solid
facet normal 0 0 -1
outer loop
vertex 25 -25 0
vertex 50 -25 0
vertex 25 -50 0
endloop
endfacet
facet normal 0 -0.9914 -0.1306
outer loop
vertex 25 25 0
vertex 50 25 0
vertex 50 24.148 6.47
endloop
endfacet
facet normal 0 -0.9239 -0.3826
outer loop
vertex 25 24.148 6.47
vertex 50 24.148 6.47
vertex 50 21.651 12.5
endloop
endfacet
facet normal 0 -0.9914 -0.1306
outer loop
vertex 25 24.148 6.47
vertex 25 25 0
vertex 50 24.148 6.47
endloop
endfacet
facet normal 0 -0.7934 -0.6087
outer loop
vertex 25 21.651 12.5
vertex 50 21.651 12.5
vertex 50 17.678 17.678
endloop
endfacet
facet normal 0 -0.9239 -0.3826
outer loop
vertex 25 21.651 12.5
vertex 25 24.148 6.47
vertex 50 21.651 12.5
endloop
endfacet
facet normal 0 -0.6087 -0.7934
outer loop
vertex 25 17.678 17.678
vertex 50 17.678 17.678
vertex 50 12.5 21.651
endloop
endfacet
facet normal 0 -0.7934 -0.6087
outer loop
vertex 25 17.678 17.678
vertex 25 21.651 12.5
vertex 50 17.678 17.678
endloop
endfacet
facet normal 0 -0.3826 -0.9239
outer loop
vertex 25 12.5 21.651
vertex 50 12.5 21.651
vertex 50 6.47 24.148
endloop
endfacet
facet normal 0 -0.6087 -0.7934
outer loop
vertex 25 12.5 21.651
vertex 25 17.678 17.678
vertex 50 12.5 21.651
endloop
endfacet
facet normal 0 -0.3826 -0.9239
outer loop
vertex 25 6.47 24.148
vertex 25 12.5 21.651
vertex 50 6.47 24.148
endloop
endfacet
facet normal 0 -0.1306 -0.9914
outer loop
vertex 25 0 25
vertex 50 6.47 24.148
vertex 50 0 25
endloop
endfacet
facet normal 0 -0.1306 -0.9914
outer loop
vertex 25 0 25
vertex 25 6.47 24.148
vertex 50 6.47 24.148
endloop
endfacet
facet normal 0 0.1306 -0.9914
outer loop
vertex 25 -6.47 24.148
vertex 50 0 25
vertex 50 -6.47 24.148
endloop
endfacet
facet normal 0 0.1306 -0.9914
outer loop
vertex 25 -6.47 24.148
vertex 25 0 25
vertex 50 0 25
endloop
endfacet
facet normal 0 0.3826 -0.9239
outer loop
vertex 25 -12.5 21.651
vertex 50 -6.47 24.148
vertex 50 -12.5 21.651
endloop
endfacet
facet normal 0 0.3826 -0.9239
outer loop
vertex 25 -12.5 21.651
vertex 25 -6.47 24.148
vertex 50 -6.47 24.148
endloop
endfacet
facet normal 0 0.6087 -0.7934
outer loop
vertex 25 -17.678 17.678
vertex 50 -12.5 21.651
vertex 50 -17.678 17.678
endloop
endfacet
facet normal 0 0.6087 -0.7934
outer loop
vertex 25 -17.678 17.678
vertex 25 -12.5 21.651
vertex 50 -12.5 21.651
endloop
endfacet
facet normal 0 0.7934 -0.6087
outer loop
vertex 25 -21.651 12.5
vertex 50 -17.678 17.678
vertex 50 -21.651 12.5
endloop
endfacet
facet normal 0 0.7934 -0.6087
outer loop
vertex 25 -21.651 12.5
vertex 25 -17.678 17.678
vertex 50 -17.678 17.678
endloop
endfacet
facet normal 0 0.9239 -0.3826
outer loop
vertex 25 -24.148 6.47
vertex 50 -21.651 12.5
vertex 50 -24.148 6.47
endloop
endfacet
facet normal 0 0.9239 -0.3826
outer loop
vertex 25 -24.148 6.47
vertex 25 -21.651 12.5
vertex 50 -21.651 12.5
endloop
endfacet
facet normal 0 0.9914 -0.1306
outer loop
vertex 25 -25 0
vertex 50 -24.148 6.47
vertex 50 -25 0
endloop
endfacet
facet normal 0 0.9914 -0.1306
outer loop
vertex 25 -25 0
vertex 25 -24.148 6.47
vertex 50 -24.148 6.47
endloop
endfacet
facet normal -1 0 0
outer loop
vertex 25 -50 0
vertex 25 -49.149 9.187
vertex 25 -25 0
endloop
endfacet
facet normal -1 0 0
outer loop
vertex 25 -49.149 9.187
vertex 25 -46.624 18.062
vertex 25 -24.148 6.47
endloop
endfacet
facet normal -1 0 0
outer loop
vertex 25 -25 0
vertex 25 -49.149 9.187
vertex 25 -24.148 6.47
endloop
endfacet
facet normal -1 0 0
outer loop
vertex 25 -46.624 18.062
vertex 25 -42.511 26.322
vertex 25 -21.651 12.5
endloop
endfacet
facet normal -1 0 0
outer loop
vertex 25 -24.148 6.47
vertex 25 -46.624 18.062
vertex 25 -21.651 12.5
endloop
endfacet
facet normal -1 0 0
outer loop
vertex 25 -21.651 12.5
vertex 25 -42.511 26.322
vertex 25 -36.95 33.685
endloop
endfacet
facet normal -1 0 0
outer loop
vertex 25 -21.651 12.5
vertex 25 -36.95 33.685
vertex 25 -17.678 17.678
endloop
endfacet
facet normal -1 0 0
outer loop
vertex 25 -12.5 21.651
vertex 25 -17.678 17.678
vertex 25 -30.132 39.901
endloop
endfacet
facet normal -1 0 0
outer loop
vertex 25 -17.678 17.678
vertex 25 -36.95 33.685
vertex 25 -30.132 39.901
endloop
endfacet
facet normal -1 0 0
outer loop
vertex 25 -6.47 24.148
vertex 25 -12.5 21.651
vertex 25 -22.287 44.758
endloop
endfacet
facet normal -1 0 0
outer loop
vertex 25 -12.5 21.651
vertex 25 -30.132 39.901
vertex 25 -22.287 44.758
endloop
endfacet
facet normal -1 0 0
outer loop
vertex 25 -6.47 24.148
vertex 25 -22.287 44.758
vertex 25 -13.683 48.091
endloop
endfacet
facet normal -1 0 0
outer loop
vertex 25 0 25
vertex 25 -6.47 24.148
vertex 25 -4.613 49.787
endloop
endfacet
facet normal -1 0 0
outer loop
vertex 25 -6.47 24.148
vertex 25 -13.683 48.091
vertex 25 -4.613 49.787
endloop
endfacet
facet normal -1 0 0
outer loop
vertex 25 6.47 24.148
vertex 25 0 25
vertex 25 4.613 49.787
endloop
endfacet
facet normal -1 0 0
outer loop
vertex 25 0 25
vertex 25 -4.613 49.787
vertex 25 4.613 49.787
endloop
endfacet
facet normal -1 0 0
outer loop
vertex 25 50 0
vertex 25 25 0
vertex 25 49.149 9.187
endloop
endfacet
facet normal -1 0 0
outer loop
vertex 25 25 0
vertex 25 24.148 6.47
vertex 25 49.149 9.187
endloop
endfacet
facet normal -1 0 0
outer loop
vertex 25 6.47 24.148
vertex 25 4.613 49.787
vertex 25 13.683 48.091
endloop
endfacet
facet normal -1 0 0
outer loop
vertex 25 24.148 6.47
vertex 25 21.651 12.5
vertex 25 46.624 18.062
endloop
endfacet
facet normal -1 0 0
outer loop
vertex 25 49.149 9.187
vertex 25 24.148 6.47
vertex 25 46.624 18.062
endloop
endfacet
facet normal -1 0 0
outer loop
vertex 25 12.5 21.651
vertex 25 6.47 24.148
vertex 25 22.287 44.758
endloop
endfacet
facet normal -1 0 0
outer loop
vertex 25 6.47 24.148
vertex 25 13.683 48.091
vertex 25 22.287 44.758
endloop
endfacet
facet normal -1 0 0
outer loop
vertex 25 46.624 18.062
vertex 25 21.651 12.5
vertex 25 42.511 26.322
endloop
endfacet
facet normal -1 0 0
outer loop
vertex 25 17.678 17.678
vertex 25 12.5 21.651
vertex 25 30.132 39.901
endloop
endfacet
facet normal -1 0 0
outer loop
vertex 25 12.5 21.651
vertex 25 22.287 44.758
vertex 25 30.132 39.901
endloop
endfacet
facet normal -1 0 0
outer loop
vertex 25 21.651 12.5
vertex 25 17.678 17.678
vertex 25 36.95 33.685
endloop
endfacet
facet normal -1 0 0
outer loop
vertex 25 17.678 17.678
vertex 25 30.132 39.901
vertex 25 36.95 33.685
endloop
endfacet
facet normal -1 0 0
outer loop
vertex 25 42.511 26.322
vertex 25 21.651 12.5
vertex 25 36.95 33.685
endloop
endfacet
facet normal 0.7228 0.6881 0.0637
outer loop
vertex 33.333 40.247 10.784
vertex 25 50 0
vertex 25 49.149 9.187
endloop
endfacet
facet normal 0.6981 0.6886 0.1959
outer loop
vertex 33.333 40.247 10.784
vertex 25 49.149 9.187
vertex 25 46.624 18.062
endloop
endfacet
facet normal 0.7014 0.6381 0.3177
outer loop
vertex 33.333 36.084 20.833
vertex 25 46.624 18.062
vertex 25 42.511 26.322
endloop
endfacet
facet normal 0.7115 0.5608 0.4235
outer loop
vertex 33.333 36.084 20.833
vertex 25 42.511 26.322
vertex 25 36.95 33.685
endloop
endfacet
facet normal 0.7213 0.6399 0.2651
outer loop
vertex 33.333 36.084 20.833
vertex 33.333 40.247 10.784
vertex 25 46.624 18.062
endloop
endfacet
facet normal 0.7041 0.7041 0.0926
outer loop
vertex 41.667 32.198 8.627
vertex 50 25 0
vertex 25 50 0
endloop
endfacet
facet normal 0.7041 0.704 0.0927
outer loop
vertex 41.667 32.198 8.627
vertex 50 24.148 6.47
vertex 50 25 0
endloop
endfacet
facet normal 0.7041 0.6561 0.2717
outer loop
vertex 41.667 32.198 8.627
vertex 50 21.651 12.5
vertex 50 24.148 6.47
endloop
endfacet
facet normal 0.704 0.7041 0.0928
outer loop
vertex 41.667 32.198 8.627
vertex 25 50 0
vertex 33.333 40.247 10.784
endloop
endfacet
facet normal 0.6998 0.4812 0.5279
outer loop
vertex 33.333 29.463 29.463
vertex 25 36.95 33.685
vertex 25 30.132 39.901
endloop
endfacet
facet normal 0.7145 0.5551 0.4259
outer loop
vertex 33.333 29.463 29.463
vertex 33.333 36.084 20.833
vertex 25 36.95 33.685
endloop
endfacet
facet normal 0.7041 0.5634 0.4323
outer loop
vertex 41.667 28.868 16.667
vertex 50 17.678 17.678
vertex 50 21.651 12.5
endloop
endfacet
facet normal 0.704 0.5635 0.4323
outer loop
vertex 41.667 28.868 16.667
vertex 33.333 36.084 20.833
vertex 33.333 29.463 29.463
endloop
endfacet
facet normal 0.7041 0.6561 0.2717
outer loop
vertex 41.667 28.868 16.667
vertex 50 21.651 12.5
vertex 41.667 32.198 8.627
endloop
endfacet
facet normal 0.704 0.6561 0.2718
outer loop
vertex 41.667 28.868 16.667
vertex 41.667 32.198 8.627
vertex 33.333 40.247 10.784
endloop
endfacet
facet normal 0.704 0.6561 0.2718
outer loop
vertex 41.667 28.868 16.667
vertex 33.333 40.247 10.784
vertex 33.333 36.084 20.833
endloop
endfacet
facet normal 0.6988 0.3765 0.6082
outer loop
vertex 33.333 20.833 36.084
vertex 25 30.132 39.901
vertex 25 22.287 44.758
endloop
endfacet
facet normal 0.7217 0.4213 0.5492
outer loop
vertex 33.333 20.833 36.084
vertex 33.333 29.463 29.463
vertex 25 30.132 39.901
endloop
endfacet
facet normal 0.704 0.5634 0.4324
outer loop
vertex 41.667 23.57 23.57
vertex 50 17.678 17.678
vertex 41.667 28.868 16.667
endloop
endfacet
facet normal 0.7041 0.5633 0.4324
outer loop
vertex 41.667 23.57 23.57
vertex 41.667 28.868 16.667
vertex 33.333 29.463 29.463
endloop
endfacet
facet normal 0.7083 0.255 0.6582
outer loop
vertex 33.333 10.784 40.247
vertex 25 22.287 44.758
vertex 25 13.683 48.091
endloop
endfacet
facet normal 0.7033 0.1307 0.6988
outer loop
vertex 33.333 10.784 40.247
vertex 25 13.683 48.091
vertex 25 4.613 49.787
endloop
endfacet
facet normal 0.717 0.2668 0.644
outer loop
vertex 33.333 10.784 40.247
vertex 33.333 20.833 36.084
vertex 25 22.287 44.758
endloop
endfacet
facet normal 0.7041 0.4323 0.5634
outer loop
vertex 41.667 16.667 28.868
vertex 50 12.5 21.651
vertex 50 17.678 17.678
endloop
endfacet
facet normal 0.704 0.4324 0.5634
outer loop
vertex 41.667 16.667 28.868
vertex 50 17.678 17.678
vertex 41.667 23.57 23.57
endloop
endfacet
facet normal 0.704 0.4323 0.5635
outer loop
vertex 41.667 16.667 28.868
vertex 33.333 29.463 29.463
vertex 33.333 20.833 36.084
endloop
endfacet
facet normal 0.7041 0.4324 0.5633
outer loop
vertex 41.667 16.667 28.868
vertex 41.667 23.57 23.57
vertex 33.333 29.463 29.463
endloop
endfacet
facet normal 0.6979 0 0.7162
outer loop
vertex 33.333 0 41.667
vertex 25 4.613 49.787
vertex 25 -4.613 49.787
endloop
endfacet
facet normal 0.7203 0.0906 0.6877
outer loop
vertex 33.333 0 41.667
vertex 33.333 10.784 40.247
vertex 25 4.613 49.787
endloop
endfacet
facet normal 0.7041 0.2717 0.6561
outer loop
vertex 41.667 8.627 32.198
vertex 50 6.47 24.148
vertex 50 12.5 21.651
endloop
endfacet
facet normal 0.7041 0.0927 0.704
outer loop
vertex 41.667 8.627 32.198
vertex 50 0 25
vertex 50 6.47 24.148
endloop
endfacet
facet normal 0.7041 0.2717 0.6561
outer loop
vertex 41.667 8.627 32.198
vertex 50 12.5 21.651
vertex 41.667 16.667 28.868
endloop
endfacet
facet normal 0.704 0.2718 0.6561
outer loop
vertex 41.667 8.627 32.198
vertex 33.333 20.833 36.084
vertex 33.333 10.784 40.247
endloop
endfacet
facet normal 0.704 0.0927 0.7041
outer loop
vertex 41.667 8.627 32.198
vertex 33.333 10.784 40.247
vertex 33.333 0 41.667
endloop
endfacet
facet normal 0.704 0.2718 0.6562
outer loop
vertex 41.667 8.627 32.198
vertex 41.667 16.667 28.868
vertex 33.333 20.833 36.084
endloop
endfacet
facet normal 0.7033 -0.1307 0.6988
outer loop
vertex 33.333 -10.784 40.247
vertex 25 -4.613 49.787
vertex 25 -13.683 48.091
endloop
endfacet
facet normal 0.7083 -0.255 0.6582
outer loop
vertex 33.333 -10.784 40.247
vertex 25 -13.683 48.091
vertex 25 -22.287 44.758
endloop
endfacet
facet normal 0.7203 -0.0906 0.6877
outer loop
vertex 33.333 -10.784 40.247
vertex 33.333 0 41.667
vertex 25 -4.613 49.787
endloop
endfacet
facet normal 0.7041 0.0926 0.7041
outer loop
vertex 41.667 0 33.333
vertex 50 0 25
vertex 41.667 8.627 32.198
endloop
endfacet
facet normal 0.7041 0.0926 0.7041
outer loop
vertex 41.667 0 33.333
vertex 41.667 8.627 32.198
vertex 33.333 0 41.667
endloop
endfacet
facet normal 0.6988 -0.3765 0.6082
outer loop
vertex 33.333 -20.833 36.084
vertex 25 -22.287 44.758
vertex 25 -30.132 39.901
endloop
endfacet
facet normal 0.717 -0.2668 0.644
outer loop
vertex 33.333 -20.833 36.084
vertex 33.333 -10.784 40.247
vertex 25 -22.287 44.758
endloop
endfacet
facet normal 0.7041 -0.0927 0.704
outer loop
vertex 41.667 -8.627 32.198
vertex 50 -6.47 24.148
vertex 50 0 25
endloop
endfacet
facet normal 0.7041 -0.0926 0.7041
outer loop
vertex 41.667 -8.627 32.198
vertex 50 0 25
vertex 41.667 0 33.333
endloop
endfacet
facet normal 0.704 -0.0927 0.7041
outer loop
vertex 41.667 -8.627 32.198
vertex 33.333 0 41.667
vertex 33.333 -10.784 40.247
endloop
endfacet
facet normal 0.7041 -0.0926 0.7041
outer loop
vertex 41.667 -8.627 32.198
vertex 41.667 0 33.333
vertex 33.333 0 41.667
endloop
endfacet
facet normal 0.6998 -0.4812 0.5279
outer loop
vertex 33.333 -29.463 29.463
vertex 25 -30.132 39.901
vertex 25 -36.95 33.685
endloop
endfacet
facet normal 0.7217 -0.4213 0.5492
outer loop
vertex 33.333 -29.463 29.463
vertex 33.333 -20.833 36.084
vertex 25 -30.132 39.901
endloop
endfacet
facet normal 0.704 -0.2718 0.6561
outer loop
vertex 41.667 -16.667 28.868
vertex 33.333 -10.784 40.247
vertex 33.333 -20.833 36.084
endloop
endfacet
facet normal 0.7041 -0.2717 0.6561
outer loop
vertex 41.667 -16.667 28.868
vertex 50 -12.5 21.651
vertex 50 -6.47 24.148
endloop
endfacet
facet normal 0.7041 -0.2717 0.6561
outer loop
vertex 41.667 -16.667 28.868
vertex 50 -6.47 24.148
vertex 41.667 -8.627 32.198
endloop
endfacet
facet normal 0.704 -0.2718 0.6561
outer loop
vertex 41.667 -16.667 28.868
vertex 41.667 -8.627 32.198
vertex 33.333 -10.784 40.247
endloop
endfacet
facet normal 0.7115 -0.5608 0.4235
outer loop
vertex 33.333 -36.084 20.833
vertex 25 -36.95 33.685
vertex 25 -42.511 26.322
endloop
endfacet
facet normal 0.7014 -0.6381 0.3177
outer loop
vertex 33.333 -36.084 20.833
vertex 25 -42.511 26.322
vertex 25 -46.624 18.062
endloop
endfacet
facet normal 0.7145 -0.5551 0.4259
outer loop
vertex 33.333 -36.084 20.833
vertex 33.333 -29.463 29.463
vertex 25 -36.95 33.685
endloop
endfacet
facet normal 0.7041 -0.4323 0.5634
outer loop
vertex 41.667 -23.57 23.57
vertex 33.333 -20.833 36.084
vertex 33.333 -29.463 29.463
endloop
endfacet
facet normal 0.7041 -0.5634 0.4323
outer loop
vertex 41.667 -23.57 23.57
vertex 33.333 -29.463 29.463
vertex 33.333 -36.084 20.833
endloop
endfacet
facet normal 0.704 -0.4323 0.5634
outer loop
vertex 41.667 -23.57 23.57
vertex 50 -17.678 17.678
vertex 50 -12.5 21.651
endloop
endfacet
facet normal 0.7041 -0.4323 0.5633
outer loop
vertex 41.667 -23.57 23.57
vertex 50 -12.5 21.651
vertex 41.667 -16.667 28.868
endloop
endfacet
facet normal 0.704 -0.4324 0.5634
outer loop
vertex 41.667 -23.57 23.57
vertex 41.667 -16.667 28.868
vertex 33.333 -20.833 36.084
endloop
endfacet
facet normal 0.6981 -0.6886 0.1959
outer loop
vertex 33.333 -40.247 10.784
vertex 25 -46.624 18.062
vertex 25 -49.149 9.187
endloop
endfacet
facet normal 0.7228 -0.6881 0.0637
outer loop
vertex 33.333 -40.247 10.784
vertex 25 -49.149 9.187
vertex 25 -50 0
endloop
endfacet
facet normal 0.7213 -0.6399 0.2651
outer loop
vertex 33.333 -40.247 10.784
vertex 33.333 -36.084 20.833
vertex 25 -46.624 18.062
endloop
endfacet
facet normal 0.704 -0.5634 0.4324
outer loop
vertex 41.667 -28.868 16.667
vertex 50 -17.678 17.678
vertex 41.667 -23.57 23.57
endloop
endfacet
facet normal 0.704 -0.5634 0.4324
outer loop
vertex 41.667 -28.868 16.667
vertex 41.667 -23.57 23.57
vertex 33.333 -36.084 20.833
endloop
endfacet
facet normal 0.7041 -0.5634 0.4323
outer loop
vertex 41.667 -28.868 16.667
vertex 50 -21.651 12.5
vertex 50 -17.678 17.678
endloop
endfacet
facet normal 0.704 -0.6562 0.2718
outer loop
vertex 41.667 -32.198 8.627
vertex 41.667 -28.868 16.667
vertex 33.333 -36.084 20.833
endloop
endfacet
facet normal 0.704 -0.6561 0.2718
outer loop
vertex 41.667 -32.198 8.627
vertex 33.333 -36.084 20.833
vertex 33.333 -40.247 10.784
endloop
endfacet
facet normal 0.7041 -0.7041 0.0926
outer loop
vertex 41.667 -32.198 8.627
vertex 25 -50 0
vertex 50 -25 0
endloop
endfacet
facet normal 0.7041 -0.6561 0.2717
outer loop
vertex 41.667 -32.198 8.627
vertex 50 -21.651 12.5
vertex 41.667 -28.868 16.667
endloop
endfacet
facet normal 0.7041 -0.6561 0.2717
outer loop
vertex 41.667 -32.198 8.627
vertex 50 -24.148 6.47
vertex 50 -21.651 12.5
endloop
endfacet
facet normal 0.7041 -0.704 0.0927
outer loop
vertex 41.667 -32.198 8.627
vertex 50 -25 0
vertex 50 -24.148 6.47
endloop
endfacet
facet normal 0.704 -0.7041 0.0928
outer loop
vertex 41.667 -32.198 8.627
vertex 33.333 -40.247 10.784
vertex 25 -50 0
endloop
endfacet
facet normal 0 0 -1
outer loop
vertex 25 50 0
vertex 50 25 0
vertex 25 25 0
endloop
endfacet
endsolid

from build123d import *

# Parameters (mm, degrees)
SKETCH001_W      = 178.926751
SKETCH001_H      = 164.552085
PAD_DEPTH        = 25
REVOLUTION_ANGLE = 180


with BuildPart() as pad:
    # Sketch001 → Pad (new body)
    with BuildSketch(Plane.YZ):
        with Locations((1.16814, -0.450252)):
            Rectangle(SKETCH001_W, SKETCH001_H)
    extrude(amount=PAD_DEPTH)


with BuildPart() as cut:
    # Sketch → Revolution (revolve)
    with BuildSketch(Plane.XY):
        Polygon((0, 25), (0, 75), (50, 25), align=None)
    revolve(axis=Axis((0, 0, 0), (1, 0, 0)), revolution_arc=REVOLUTION_ANGLE)

    # Cut: cut Pad
    add(pad.part, mode=Mode.SUBTRACT)


solid = cut.part
